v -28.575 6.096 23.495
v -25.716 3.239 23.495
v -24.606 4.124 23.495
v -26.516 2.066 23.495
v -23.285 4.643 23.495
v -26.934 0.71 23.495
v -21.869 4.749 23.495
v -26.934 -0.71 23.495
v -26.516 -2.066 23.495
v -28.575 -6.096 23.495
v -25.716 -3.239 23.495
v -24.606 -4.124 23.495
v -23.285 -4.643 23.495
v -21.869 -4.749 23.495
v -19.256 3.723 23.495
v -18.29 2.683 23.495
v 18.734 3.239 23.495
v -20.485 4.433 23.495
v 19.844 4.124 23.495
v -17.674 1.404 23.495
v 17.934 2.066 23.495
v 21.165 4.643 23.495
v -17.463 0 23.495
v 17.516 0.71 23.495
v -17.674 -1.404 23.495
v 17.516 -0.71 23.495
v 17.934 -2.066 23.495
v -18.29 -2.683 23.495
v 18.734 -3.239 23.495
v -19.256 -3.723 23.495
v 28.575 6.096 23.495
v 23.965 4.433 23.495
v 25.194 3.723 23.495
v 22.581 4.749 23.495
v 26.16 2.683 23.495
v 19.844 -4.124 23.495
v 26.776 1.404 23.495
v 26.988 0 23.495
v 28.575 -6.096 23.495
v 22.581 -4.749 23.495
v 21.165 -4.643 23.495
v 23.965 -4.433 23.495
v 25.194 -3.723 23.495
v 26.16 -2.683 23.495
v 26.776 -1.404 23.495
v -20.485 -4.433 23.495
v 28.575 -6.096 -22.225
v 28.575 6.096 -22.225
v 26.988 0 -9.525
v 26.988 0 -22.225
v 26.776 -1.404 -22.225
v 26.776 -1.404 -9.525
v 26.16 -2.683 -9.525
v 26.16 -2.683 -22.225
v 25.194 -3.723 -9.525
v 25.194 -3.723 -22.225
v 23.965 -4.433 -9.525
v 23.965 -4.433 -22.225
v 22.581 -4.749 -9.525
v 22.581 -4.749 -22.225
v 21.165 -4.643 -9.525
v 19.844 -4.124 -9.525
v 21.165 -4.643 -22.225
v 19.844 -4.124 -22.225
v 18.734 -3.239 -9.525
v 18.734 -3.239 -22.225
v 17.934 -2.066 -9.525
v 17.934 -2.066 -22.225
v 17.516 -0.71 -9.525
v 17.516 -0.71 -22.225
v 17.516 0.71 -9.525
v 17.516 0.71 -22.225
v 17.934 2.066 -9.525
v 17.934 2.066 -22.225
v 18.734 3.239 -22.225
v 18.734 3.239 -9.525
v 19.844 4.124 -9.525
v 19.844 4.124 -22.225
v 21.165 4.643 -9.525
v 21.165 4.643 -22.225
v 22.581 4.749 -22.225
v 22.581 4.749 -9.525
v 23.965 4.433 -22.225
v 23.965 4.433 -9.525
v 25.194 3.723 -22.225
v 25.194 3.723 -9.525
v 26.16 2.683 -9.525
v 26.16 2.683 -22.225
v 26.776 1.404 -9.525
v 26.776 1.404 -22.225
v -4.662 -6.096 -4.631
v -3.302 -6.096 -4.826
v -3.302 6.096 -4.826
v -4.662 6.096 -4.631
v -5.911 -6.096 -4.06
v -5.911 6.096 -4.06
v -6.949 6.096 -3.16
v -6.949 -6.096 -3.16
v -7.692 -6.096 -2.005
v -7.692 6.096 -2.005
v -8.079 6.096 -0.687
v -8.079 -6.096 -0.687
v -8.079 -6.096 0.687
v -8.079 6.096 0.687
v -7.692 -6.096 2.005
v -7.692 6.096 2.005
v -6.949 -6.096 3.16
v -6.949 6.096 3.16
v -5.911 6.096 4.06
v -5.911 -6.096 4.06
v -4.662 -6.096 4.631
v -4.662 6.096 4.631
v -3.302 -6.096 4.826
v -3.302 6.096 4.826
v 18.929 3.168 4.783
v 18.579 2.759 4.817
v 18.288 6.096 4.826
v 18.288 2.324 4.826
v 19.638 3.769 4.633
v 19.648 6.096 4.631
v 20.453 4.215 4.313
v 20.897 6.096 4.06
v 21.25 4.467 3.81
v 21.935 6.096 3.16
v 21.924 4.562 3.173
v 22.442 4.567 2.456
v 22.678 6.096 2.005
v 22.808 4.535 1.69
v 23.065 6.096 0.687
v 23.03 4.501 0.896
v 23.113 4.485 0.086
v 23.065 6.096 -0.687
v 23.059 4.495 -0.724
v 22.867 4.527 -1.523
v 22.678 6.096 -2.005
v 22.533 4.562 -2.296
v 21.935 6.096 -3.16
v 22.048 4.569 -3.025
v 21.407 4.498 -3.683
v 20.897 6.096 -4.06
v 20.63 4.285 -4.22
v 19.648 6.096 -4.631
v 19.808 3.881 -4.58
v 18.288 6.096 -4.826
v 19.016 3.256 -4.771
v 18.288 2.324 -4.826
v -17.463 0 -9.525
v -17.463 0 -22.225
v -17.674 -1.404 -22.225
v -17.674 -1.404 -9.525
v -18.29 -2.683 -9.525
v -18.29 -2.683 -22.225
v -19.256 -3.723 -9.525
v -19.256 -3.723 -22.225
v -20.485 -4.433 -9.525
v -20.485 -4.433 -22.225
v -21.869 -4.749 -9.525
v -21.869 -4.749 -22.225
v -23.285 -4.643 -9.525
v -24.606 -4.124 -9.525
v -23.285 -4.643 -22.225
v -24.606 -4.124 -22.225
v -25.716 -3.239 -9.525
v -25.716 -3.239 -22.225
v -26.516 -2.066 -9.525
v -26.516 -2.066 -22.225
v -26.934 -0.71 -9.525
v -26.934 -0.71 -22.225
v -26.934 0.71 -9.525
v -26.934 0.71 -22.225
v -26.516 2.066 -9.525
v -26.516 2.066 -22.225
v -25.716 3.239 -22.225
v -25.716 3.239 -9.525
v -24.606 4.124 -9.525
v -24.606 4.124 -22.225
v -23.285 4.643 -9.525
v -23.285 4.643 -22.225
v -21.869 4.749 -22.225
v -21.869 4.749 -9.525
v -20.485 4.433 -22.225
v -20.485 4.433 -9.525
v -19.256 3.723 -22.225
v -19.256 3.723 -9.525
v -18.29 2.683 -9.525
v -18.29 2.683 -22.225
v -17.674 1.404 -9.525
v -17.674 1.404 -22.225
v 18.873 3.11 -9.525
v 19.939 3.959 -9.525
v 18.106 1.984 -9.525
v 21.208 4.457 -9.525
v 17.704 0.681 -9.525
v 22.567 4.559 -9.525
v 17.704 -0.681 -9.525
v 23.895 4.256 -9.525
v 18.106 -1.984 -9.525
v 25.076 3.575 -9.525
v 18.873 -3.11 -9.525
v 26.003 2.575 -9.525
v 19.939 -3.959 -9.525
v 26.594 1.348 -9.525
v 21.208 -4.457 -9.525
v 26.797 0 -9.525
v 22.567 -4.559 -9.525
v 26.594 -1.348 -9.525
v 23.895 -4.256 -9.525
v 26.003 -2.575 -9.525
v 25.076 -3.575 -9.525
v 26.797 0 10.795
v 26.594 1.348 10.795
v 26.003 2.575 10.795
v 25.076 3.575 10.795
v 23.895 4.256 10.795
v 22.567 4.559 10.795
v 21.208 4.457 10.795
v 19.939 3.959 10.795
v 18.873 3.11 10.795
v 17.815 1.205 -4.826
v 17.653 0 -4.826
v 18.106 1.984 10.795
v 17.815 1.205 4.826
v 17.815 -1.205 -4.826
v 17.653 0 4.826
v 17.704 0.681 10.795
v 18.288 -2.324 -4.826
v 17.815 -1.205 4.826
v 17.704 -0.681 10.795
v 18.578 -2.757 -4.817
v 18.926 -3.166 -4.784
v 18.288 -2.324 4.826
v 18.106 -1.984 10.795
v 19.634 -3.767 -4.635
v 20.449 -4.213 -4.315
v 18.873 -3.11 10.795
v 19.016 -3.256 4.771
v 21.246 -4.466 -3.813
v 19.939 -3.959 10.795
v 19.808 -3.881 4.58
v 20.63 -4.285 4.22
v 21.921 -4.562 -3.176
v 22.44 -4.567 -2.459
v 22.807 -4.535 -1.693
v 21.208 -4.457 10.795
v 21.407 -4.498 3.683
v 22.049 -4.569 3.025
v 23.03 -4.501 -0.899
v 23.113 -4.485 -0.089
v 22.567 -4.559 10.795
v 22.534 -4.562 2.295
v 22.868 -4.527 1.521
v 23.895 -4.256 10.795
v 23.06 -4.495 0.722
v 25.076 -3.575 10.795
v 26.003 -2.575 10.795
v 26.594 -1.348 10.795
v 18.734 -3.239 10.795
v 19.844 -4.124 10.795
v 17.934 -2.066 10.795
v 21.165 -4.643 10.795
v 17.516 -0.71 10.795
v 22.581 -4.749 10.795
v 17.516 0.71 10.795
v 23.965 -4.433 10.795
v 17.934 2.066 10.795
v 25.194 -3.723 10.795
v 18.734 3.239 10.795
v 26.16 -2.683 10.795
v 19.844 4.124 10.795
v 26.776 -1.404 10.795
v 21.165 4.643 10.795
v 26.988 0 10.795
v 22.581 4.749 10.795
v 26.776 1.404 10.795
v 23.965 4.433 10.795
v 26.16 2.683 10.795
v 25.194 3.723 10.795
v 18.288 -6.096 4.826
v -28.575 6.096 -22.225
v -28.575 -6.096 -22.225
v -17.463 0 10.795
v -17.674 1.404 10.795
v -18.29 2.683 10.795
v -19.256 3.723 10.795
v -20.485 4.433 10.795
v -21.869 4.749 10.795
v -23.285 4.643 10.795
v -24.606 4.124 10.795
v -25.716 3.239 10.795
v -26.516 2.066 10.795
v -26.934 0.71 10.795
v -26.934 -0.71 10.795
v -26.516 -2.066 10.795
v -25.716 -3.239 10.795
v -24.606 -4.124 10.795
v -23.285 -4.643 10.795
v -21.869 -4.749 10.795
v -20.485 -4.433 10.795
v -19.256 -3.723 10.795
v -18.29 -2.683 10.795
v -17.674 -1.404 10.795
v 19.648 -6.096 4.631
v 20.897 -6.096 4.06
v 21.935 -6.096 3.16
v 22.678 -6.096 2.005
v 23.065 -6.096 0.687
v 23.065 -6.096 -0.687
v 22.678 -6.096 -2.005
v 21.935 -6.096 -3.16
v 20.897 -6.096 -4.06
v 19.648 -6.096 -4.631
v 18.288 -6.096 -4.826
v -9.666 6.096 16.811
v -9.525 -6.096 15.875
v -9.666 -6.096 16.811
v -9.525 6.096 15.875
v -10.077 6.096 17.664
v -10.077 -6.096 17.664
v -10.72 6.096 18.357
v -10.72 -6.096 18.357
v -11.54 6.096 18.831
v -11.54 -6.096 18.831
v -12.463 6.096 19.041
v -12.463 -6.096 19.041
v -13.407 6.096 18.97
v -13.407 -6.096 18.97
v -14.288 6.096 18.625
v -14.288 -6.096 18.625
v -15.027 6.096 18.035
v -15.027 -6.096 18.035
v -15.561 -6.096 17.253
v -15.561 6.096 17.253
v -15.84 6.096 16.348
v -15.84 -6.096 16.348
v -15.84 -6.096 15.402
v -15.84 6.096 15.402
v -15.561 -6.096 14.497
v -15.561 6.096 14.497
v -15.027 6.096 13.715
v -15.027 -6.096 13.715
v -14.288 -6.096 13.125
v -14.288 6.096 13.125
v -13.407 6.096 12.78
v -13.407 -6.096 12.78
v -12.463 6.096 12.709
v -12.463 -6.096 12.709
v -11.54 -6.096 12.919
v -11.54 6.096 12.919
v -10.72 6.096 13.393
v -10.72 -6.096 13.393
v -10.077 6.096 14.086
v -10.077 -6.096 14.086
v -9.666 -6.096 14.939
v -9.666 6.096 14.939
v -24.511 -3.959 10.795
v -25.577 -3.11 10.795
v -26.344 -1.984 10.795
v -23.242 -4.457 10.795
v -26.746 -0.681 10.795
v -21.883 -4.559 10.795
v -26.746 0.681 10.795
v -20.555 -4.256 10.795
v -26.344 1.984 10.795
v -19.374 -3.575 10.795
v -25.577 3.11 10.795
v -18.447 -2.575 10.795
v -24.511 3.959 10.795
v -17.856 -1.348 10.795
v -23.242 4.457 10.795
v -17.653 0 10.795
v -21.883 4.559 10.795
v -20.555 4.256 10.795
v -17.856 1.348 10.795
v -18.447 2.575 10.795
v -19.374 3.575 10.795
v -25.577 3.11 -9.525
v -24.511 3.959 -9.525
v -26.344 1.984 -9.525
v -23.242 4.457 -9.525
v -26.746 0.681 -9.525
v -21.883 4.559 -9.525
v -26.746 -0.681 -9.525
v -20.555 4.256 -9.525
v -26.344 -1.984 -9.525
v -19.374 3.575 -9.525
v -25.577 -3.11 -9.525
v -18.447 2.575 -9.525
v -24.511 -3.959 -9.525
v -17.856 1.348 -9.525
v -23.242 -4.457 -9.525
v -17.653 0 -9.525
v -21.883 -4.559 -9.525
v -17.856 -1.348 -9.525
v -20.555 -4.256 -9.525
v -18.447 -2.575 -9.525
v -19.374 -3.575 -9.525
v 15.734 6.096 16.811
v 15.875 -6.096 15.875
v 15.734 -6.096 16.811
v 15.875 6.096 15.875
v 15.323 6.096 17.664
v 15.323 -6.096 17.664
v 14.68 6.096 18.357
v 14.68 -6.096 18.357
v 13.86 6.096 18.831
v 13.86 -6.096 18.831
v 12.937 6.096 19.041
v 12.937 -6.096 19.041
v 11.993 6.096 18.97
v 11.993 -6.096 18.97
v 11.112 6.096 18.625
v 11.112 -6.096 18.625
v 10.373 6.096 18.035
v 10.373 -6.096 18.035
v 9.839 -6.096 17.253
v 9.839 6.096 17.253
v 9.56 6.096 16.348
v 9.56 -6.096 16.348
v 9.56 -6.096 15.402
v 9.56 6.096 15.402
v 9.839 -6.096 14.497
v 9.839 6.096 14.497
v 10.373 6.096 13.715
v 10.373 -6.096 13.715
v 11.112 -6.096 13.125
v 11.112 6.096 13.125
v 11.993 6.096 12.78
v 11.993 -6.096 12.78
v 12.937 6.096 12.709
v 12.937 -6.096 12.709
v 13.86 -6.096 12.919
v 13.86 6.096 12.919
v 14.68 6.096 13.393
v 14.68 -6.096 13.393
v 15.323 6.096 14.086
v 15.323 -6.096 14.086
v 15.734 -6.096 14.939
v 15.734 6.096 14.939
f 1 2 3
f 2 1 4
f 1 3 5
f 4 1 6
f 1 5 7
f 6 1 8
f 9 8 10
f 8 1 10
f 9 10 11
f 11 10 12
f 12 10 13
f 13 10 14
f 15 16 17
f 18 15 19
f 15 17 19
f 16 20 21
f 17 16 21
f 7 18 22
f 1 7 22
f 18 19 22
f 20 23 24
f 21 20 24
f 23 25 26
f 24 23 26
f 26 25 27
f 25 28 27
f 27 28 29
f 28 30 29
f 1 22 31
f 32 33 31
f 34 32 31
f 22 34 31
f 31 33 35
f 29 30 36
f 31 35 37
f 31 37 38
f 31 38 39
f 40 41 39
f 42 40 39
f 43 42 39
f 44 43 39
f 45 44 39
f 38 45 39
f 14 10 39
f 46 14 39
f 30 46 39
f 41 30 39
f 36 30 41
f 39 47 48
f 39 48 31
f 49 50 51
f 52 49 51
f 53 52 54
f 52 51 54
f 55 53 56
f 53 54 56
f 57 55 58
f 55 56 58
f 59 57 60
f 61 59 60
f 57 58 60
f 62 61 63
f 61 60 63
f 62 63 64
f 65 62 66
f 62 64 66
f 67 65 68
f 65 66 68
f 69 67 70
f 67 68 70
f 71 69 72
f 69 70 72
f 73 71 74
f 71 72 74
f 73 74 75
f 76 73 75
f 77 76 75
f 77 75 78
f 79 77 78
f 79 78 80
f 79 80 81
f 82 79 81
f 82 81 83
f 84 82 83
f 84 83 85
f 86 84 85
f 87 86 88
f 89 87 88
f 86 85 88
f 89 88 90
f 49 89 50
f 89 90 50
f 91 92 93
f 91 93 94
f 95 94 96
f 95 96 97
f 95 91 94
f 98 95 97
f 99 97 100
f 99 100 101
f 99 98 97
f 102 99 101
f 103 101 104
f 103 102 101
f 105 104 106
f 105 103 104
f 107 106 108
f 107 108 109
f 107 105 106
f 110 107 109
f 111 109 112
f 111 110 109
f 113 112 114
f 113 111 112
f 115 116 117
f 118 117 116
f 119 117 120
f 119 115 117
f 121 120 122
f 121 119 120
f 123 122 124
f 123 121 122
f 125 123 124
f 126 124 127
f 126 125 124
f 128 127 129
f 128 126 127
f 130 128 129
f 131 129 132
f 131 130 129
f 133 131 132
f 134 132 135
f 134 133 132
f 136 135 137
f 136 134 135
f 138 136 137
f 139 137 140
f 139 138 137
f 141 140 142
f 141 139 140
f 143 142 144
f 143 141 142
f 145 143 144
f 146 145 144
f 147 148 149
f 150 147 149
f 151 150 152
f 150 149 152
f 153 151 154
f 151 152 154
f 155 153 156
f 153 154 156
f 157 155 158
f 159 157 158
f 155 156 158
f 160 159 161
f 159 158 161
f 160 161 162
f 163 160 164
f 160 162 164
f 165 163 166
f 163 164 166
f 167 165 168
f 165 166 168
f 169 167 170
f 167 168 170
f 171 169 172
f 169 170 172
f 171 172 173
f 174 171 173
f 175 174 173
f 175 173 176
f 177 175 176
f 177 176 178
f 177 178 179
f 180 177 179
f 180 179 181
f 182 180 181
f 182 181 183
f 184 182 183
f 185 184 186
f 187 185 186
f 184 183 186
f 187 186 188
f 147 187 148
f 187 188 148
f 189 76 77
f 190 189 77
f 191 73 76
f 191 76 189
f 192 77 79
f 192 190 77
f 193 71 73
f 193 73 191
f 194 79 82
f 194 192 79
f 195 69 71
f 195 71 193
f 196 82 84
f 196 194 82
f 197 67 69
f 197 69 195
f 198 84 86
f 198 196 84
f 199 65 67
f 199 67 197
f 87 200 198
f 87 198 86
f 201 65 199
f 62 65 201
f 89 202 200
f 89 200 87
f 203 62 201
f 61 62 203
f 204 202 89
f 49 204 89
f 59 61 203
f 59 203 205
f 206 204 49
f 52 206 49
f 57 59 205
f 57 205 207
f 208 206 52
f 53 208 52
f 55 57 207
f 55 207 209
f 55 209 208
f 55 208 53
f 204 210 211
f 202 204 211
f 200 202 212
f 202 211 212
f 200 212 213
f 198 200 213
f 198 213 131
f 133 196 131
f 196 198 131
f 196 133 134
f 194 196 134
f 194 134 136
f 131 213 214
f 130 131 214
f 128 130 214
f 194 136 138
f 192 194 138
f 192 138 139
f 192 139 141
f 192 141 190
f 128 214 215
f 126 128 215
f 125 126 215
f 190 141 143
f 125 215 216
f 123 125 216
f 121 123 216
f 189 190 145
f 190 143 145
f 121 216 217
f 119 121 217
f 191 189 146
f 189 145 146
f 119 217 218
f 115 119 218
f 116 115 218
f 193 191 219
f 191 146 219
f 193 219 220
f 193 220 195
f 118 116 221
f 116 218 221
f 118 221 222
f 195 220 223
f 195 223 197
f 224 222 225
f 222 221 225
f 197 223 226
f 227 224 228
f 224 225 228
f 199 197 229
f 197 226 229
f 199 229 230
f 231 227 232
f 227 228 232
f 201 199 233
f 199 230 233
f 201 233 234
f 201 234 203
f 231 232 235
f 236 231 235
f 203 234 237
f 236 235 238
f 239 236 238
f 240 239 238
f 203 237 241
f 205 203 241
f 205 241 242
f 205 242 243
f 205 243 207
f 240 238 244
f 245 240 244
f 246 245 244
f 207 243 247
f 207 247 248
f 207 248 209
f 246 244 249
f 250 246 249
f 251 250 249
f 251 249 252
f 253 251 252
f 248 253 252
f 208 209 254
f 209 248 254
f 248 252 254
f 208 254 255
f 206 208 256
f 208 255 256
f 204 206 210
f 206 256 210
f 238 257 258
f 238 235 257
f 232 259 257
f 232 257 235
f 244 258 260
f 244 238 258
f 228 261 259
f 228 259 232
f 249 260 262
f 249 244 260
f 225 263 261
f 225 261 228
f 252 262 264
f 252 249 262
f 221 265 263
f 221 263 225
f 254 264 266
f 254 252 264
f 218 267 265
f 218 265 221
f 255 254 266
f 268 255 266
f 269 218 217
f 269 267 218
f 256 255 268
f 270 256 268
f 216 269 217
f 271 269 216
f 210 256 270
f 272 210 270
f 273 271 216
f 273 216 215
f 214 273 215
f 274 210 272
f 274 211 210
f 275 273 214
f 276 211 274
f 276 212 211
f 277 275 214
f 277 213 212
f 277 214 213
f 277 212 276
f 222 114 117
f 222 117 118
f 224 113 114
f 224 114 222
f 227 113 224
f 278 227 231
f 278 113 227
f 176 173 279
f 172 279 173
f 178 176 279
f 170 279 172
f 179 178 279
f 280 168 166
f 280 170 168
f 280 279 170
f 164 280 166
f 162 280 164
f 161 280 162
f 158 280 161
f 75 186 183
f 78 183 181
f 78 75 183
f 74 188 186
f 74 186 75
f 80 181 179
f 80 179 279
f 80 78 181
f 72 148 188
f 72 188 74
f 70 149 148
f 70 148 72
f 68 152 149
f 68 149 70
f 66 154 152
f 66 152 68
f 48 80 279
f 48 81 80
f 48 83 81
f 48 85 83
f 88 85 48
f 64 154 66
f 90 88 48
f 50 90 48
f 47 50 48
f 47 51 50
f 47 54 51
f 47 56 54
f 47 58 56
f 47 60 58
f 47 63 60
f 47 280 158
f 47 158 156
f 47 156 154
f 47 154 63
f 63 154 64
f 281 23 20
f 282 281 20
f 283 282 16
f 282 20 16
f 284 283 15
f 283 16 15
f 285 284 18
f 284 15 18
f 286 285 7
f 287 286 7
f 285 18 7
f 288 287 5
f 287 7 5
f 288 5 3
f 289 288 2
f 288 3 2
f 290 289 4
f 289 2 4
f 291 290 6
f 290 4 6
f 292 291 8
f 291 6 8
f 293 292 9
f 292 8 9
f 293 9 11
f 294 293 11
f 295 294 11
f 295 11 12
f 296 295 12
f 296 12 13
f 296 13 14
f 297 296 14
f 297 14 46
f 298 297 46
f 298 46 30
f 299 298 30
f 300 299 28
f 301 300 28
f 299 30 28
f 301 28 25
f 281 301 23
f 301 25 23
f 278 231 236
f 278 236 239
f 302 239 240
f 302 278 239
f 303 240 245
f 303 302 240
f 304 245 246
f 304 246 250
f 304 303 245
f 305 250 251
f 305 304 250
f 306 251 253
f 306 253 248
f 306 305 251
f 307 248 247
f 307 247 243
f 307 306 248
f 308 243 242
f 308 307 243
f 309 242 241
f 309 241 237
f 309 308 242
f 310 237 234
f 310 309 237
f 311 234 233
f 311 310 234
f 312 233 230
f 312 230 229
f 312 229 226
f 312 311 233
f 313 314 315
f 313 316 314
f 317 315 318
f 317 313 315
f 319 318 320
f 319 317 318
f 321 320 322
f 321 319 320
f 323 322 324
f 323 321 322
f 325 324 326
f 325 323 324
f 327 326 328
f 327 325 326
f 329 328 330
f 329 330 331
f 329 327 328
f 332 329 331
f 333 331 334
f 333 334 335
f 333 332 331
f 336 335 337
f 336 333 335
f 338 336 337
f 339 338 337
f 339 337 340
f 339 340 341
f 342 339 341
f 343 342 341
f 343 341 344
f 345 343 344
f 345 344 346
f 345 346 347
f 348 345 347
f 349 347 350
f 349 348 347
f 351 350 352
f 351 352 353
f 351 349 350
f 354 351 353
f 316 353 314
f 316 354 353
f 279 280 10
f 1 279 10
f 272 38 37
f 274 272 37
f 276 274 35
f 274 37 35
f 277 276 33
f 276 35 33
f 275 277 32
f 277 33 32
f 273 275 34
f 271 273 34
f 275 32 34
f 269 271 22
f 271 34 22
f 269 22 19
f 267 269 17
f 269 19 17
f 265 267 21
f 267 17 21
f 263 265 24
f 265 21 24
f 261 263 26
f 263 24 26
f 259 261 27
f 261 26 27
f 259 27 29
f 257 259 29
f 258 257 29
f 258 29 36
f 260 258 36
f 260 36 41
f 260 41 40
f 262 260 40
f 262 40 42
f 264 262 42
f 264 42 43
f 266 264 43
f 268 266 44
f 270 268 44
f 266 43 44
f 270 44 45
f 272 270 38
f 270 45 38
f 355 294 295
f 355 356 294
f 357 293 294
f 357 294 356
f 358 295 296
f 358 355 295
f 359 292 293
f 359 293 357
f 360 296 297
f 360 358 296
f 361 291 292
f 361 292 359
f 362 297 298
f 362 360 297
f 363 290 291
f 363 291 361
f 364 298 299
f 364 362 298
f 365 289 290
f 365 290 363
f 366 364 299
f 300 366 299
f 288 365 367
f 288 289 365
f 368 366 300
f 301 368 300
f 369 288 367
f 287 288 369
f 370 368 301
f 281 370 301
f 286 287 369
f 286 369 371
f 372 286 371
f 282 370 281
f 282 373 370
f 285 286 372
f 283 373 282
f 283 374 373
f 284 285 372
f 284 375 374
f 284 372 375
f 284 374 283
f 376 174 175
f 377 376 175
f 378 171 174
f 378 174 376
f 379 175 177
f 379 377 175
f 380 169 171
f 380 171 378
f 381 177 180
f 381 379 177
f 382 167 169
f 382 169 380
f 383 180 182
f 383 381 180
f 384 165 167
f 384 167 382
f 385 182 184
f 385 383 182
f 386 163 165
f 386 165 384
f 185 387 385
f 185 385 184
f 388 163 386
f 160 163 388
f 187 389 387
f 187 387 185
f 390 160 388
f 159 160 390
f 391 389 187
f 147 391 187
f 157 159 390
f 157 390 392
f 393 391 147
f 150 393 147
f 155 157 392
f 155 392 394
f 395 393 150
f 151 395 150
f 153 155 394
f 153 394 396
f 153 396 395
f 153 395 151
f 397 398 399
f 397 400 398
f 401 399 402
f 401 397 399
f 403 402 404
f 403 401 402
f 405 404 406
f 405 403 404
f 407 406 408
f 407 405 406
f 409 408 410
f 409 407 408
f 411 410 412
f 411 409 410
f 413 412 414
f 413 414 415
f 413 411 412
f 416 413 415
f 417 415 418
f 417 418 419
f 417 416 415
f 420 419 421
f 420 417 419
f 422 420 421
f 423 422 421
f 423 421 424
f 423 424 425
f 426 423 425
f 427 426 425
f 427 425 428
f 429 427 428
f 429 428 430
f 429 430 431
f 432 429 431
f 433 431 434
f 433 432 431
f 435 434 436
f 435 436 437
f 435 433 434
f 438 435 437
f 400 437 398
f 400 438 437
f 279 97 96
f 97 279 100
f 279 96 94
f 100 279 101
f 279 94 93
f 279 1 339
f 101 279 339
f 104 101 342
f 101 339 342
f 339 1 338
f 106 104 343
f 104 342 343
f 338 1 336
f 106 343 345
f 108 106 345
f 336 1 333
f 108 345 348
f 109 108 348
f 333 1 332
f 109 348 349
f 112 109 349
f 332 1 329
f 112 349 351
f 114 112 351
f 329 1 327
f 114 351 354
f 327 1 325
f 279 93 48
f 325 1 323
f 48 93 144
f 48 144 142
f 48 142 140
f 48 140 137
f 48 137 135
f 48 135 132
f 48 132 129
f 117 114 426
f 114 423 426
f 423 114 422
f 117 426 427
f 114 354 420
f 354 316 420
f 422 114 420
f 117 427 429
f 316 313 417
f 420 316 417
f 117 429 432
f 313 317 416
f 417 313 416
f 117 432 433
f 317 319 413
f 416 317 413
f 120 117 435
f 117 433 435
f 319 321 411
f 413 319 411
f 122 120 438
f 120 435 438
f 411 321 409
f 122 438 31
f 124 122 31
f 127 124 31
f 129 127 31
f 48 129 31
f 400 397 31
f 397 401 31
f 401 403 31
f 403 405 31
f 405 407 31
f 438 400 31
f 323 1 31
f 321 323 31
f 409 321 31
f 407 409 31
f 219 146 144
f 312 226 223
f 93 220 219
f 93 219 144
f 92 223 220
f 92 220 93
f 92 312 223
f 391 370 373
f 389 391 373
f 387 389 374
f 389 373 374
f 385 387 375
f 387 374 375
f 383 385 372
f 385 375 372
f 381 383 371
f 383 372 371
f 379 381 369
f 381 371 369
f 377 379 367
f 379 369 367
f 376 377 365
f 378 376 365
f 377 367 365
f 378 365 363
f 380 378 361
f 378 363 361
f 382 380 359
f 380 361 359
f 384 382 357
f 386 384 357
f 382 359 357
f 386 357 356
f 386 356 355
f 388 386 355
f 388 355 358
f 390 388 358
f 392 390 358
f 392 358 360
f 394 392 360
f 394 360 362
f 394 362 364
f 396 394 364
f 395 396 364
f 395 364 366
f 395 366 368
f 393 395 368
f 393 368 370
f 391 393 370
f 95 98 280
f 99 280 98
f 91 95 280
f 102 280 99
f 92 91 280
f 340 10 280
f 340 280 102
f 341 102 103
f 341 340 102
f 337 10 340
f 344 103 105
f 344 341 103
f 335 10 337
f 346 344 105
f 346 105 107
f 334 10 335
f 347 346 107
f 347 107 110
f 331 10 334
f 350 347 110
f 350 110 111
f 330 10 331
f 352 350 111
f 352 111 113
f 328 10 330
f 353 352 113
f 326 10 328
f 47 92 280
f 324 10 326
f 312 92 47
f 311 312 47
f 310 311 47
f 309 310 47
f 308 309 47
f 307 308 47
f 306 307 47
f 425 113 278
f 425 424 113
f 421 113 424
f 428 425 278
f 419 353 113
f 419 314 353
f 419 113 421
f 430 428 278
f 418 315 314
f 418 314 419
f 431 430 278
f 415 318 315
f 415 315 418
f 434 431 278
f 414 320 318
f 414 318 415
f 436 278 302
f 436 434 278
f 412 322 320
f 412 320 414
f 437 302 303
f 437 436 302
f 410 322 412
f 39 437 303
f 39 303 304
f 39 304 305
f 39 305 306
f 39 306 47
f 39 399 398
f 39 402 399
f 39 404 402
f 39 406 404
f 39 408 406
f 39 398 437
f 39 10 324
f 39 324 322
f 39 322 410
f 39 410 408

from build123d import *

# Parameters (mm, degrees)
F0_W     = 57.15
F0_H     = 45.72
F0_R     = 3.175
F1_DEPTH = 6.096
F2_R     = 4.572
F3_DEPTH = 45.721
F4_R     = 4.7625
F5_DEPTH = 12.7
F6_R     = 4.7625
F7_DEPTH = 12.7


with BuildPart() as f1:
    # F0 (on Front) → F1 (new body, symmetric)
    with BuildSketch(Plane.XZ):
        with Locations((0, 0.635)):
            Rectangle(F0_W, F0_H)
        with BuildLine():
            ThreePointArc((-3.302, -4.826), (-8.128, 0), (-3.302, 4.826))
            Line((-3.302, 4.826), (18.288, 4.826))
            ThreePointArc((18.288, 4.826), (23.114, 0), (18.288, -4.826))
            Line((18.288, -4.826), (-3.302, -4.826))
        make_face(mode=Mode.SUBTRACT)
        with Locations((-12.7, 15.875)):
            Circle(F0_R, mode=Mode.SUBTRACT)
        with Locations((12.7, 15.875)):
            Circle(F0_R, mode=Mode.SUBTRACT)
    extrude(amount=F1_DEPTH, both=True)

    # F2 (on face) → F3 (cut, through all)
    with BuildSketch(Plane.XY.offset(23.495)):
        with Locations((-22.225, 0)):
            Circle(F2_R)
        with Locations((22.225, 0)):
            Circle(F2_R)
    extrude(amount=-F3_DEPTH, mode=Mode.SUBTRACT)

    # F4 (on face) → F5 (cut)
    with BuildSketch(Plane.XY.offset(23.495)):
        with Locations((-22.225, 0)):
            Circle(F4_R)
        with Locations((22.225, 0)):
            Circle(F4_R)
    extrude(amount=-F5_DEPTH, mode=Mode.SUBTRACT)

    # F6 (on face) → F7 (cut)
    with BuildSketch(Plane(origin=(0, 0, -22.225), x_dir=(1, 0, 0), z_dir=(0, 0, -1))):
        with Locations((22.225, 0)):
            Circle(F6_R)
        with Locations((-22.225, 0)):
            Circle(F6_R)
    extrude(amount=-F7_DEPTH, mode=Mode.SUBTRACT)


solid = f1.part
